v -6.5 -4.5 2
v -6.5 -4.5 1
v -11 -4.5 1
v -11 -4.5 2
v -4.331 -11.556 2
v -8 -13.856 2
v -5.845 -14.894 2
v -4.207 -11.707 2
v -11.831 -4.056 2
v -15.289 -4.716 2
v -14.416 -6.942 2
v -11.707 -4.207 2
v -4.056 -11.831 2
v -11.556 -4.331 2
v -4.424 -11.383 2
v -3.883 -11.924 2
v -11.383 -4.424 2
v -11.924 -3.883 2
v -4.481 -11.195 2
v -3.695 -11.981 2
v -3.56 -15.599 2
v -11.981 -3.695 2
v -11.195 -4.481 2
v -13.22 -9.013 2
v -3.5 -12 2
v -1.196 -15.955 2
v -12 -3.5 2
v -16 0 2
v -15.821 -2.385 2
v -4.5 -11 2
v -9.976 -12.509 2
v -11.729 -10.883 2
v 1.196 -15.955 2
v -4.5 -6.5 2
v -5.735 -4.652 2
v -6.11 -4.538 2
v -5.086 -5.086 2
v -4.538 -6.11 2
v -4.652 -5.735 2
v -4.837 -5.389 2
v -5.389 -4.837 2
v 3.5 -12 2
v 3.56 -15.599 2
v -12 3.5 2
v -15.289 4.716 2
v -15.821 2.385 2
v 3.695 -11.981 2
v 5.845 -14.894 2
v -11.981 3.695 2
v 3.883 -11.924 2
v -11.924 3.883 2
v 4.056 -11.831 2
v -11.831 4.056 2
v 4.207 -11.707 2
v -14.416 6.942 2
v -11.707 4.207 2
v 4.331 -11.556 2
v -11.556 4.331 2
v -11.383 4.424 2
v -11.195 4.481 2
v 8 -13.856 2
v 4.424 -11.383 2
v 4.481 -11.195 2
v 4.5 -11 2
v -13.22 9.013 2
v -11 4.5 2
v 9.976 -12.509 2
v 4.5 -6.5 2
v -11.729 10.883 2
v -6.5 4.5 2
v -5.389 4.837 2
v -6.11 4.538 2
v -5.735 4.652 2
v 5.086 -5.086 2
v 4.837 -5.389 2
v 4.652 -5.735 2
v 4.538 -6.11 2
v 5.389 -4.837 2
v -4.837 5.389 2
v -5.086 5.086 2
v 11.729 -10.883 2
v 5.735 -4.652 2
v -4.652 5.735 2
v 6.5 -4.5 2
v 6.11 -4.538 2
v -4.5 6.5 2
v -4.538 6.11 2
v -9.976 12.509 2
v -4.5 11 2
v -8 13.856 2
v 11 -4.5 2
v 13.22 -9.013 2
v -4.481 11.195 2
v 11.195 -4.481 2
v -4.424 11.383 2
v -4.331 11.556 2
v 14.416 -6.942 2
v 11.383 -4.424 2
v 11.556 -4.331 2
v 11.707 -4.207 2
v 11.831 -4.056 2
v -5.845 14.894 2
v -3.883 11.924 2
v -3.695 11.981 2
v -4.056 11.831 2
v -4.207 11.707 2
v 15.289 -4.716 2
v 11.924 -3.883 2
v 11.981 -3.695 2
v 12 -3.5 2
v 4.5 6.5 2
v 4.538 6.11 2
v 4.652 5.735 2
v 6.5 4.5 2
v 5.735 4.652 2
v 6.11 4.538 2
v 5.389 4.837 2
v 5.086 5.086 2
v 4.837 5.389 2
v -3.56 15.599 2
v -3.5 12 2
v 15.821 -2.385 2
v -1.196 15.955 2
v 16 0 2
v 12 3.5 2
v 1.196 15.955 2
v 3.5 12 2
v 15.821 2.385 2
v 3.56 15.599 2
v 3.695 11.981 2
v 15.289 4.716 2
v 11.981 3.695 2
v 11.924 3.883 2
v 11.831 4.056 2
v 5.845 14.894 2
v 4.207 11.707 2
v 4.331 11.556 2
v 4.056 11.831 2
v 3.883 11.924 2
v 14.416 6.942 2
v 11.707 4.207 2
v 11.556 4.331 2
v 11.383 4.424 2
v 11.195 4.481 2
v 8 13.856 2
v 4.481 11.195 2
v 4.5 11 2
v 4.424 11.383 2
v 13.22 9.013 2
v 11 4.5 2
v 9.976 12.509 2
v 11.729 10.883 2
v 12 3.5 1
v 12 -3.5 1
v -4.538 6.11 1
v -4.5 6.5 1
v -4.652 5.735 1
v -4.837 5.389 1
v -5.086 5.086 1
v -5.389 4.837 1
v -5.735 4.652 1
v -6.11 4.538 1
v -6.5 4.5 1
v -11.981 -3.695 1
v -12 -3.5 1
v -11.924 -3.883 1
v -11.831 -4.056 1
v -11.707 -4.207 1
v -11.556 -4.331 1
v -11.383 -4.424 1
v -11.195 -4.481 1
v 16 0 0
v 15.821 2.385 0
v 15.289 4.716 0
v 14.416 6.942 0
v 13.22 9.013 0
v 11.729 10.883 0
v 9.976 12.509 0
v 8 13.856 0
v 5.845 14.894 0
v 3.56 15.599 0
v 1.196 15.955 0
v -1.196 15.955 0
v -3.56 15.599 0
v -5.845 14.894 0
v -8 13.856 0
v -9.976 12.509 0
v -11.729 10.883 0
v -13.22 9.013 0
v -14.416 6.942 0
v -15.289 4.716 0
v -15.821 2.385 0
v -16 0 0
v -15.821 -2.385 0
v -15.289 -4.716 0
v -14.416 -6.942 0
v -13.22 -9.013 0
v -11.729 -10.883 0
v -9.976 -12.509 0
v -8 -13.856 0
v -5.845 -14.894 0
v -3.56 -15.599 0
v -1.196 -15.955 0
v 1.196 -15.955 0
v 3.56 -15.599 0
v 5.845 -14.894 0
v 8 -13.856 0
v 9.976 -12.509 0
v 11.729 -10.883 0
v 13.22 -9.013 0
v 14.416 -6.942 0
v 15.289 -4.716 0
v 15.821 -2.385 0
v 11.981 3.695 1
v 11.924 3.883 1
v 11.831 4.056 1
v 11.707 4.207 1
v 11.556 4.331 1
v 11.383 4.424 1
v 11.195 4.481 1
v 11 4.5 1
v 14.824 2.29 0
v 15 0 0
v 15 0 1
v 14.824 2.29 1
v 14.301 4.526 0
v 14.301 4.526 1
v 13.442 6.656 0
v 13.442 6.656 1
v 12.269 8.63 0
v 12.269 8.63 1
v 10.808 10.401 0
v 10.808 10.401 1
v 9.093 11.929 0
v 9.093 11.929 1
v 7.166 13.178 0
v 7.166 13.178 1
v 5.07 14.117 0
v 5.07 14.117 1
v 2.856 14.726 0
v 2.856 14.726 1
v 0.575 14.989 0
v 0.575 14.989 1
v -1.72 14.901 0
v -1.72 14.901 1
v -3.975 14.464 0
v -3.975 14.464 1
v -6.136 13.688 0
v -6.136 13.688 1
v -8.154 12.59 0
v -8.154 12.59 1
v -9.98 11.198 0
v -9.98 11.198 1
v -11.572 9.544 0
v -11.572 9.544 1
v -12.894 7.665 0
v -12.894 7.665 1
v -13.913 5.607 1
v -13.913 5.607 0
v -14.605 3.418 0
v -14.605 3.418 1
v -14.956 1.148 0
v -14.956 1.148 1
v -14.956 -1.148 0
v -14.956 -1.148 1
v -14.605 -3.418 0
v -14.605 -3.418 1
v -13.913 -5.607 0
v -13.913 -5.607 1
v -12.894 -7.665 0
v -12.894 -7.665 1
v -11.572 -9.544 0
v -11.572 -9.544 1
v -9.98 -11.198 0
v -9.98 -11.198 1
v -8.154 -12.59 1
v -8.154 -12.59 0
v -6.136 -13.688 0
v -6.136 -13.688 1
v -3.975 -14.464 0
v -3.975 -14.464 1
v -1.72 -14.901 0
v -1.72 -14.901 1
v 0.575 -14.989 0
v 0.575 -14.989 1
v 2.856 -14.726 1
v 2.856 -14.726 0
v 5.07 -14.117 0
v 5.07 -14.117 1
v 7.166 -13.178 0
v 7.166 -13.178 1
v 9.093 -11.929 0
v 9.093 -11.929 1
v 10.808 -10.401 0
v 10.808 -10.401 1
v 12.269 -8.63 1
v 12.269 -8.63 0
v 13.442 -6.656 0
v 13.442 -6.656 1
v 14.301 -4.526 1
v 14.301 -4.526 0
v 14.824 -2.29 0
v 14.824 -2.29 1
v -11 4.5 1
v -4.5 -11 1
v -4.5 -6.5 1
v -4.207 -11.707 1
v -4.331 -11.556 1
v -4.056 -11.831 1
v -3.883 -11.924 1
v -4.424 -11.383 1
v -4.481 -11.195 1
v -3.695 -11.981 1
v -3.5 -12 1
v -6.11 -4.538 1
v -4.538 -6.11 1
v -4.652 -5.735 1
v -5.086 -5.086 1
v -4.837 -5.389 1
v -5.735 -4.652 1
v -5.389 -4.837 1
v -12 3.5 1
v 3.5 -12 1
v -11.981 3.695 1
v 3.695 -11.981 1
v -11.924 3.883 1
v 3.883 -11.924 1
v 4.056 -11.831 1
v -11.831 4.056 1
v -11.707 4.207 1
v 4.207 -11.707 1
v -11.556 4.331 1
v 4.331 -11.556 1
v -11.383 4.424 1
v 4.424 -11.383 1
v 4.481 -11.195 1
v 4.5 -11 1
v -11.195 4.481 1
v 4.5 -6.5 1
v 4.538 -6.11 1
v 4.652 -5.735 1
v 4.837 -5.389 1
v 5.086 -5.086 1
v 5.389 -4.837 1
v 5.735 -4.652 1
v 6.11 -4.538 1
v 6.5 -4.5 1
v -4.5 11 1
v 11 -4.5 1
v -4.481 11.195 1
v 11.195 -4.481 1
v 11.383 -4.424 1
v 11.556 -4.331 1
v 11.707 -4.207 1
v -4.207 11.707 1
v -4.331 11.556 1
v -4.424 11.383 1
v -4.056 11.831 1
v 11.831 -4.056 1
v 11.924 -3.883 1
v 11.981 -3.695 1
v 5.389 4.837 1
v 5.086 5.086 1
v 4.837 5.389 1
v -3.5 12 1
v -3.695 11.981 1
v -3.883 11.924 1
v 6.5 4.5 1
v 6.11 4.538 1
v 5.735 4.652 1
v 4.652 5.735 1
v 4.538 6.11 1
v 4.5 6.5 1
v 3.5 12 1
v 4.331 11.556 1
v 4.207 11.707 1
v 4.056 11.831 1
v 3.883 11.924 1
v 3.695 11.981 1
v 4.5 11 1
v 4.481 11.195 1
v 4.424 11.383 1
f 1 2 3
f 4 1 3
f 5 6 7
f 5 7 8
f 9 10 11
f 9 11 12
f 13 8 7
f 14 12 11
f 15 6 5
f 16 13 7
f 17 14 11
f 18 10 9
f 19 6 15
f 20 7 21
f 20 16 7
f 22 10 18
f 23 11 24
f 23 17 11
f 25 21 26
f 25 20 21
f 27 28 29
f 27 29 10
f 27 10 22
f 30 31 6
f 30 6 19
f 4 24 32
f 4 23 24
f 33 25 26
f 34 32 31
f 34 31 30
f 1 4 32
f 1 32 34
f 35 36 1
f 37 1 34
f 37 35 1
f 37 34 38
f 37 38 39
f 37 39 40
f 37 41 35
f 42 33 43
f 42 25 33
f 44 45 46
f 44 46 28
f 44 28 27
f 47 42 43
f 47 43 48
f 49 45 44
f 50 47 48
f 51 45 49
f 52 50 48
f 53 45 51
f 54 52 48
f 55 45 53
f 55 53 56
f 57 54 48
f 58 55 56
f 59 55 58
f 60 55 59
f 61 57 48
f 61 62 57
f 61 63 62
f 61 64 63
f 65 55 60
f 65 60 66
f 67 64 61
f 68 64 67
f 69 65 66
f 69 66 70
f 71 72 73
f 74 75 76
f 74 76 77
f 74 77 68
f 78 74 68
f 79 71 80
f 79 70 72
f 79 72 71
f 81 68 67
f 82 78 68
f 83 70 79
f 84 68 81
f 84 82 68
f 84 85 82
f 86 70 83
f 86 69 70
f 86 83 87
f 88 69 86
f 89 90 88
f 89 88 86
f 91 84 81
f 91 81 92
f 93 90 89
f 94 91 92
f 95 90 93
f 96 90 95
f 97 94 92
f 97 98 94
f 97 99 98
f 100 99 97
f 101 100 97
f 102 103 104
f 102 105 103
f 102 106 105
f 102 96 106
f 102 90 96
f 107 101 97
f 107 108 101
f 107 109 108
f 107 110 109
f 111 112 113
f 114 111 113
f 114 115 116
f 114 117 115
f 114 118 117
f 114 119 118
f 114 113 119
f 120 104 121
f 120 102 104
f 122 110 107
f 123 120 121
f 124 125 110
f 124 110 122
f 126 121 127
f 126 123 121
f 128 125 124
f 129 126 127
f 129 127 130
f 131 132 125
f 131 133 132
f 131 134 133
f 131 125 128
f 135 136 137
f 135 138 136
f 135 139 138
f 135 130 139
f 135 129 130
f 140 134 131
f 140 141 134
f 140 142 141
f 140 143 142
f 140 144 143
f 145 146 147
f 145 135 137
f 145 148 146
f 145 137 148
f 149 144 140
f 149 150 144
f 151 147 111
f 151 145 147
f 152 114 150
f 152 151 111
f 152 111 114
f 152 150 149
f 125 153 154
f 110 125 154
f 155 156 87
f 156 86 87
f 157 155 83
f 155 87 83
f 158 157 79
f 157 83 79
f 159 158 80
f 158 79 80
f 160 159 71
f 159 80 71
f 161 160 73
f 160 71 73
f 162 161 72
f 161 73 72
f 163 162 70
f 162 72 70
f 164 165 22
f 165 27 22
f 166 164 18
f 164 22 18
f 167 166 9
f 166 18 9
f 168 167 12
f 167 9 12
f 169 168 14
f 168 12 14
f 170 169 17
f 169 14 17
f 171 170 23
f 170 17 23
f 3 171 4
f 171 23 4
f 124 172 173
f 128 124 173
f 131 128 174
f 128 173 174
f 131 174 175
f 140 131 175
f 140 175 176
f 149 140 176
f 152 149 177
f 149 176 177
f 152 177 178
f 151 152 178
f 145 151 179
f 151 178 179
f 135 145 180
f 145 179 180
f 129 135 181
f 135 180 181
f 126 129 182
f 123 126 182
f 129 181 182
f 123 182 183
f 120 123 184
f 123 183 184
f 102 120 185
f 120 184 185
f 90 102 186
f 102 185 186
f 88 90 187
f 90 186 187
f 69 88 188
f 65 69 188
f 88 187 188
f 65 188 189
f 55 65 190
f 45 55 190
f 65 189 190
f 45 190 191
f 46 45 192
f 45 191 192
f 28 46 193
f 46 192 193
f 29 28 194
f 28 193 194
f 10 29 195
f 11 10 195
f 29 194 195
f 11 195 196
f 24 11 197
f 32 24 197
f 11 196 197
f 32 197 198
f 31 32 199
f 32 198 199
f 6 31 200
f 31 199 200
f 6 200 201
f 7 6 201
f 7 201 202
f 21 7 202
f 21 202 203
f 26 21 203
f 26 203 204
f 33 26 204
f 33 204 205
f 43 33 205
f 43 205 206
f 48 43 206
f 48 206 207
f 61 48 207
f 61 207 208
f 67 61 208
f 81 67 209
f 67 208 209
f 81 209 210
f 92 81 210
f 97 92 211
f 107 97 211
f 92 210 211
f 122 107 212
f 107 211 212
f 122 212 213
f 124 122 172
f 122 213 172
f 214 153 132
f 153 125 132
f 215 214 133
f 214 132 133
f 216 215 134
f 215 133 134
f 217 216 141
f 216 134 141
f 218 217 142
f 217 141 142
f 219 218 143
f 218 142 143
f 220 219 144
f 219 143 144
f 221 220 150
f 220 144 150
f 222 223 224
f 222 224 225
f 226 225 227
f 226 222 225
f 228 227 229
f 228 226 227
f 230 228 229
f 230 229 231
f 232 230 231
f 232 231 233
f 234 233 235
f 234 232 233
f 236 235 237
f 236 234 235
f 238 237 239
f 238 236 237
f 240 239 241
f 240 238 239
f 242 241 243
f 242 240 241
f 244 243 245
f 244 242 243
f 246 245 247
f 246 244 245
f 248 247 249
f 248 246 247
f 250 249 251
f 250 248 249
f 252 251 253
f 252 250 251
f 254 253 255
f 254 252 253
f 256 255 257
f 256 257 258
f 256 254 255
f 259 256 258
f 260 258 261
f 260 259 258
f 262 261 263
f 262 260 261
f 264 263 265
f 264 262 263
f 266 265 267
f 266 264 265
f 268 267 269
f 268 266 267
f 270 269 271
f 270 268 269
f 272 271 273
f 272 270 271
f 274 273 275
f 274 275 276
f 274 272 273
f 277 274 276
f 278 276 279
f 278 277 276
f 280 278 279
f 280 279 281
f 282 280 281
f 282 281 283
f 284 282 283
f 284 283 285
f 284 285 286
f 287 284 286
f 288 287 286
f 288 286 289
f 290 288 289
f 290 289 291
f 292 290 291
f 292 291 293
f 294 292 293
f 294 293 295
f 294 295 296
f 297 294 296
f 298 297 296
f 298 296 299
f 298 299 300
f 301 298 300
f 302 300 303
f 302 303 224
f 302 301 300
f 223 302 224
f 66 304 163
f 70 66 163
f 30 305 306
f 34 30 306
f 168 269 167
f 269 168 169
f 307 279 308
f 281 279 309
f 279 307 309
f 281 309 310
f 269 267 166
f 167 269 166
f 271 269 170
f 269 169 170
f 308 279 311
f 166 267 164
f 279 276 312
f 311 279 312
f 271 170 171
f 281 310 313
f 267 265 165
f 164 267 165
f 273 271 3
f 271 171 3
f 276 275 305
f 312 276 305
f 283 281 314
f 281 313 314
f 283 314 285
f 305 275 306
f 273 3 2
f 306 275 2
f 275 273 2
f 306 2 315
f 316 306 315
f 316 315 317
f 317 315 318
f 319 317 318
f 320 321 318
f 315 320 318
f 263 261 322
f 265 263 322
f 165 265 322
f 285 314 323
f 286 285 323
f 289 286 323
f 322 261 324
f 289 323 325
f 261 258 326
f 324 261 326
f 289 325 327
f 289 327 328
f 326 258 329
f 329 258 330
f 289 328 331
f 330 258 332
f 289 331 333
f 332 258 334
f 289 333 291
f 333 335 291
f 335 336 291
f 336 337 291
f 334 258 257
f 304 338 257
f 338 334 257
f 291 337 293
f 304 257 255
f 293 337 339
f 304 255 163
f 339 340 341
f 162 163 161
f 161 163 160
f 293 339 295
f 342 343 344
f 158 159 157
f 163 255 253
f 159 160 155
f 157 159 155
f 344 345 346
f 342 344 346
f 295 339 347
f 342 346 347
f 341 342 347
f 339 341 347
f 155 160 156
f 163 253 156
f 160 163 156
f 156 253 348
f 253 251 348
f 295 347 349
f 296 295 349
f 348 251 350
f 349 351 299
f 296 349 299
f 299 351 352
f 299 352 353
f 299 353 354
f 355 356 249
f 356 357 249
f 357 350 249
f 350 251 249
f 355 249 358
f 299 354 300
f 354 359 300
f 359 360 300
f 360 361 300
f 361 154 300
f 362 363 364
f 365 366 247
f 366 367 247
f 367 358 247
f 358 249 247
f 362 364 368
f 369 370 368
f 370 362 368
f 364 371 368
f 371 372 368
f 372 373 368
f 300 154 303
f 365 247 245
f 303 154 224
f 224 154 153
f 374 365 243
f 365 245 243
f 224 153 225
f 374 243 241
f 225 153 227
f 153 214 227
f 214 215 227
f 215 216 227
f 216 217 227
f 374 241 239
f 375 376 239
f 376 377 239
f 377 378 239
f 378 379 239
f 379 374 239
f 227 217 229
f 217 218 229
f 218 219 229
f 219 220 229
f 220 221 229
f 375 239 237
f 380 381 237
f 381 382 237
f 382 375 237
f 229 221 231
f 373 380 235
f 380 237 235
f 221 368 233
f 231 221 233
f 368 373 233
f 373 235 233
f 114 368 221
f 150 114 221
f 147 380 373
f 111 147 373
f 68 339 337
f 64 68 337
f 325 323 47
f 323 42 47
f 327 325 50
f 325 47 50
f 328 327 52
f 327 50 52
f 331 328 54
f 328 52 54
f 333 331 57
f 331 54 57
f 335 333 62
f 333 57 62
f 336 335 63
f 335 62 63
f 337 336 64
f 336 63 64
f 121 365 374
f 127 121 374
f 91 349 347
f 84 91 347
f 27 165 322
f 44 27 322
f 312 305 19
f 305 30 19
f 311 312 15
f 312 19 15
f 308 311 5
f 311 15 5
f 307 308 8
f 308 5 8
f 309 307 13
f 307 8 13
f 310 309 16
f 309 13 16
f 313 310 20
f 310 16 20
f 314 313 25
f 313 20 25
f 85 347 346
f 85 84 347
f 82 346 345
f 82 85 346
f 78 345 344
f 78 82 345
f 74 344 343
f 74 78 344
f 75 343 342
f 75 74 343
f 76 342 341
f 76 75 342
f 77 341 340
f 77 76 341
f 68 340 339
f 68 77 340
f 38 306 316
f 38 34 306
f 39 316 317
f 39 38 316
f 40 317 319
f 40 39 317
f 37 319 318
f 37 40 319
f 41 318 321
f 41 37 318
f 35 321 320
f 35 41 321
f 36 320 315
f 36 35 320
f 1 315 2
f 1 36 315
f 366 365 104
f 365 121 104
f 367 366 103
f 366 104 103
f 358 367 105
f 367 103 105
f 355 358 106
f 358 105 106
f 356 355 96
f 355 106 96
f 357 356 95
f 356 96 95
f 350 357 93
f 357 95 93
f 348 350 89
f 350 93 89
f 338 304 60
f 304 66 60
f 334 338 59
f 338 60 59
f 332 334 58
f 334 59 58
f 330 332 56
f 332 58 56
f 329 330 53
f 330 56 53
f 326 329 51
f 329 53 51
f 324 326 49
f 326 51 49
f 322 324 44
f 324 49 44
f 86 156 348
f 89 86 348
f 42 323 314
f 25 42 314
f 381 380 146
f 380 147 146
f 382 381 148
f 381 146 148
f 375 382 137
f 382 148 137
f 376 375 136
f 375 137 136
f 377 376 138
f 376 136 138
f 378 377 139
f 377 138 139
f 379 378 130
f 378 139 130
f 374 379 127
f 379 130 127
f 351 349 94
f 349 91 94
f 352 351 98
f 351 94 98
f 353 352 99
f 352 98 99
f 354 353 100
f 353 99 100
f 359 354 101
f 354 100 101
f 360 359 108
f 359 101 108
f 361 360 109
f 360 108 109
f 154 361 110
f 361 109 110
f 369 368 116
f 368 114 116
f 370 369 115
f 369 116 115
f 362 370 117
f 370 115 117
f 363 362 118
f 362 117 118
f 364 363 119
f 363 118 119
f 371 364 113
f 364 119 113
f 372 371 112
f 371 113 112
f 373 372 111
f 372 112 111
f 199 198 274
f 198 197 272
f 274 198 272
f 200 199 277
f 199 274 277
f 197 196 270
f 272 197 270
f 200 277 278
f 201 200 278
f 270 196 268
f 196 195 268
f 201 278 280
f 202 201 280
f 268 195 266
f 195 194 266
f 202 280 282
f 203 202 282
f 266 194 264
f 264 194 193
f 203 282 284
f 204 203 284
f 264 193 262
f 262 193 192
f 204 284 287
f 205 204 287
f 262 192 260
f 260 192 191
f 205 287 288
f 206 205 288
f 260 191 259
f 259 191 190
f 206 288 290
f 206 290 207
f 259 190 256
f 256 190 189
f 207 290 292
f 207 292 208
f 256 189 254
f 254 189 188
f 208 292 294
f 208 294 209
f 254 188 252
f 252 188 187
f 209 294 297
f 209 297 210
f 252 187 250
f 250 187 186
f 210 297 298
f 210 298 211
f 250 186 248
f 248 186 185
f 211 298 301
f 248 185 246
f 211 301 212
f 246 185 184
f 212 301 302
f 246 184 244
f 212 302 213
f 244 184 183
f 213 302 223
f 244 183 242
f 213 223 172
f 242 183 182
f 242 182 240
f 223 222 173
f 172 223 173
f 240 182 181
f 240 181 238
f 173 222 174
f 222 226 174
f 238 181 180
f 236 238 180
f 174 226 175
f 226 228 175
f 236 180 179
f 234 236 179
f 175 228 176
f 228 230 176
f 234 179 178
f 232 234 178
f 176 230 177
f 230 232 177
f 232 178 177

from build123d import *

# Parameters (mm, degrees)
F0_R     = 16
F0_R_2   = 15
F1_DEPTH = 2
F2_DEPTH = 1
F3_R     = 1
F4_R     = 2


with BuildPart() as f1:
    # F0 (on Top) → F1 (new body)
    with BuildSketch(Plane.XY):
        Circle(F0_R)
        Circle(F0_R_2, mode=Mode.SUBTRACT)
        Circle(F0_R_2)
        Polygon((4.5, -4.5), (4.5, -12), (-4.5, -12), (-4.5, -4.5), (-12, -4.5), (-12, 4.5), (-4.5, 4.5), (-4.5, 12), (4.5, 12), (4.5, 4.5), (12, 4.5), (12, -4.5), align=None, mode=Mode.SUBTRACT)
    extrude(amount=F1_DEPTH)

    # F0 (on Top) → F2 (cut)
    with BuildSketch(Plane.XY):
        Circle(F0_R_2)
        Polygon((4.5, -4.5), (4.5, -12), (-4.5, -12), (-4.5, -4.5), (-12, -4.5), (-12, 4.5), (-4.5, 4.5), (-4.5, 12), (4.5, 12), (4.5, 4.5), (12, 4.5), (12, -4.5), align=None, mode=Mode.SUBTRACT)
    extrude(amount=F2_DEPTH, mode=Mode.SUBTRACT)

    # F3
    f3_edges = [f1.edges().sort_by_distance(p)[0] for p in [
        (-4.5, 12, 1.5),
        (4.5, 12, 1.5),
        (12, 4.5, 1.5),
        (12, -4.5, 1.5),
        (4.5, -12, 1.5),
        (-4.5, -12, 1.5),
        (-12, -4.5, 1.5),
        (-12, 4.5, 1.5),
    ]]
    fillet(f3_edges, radius=F3_R)

    # F4
    f4_edges = [f1.edges().sort_by_distance(p)[0] for p in [
        (-4.5, 4.5, 1.5),
        (4.5, 4.5, 1.5),
        (4.5, -4.5, 1.5),
        (-4.5, -4.5, 1.5),
    ]]
    fillet(f4_edges, radius=F4_R)


solid = f1.part
